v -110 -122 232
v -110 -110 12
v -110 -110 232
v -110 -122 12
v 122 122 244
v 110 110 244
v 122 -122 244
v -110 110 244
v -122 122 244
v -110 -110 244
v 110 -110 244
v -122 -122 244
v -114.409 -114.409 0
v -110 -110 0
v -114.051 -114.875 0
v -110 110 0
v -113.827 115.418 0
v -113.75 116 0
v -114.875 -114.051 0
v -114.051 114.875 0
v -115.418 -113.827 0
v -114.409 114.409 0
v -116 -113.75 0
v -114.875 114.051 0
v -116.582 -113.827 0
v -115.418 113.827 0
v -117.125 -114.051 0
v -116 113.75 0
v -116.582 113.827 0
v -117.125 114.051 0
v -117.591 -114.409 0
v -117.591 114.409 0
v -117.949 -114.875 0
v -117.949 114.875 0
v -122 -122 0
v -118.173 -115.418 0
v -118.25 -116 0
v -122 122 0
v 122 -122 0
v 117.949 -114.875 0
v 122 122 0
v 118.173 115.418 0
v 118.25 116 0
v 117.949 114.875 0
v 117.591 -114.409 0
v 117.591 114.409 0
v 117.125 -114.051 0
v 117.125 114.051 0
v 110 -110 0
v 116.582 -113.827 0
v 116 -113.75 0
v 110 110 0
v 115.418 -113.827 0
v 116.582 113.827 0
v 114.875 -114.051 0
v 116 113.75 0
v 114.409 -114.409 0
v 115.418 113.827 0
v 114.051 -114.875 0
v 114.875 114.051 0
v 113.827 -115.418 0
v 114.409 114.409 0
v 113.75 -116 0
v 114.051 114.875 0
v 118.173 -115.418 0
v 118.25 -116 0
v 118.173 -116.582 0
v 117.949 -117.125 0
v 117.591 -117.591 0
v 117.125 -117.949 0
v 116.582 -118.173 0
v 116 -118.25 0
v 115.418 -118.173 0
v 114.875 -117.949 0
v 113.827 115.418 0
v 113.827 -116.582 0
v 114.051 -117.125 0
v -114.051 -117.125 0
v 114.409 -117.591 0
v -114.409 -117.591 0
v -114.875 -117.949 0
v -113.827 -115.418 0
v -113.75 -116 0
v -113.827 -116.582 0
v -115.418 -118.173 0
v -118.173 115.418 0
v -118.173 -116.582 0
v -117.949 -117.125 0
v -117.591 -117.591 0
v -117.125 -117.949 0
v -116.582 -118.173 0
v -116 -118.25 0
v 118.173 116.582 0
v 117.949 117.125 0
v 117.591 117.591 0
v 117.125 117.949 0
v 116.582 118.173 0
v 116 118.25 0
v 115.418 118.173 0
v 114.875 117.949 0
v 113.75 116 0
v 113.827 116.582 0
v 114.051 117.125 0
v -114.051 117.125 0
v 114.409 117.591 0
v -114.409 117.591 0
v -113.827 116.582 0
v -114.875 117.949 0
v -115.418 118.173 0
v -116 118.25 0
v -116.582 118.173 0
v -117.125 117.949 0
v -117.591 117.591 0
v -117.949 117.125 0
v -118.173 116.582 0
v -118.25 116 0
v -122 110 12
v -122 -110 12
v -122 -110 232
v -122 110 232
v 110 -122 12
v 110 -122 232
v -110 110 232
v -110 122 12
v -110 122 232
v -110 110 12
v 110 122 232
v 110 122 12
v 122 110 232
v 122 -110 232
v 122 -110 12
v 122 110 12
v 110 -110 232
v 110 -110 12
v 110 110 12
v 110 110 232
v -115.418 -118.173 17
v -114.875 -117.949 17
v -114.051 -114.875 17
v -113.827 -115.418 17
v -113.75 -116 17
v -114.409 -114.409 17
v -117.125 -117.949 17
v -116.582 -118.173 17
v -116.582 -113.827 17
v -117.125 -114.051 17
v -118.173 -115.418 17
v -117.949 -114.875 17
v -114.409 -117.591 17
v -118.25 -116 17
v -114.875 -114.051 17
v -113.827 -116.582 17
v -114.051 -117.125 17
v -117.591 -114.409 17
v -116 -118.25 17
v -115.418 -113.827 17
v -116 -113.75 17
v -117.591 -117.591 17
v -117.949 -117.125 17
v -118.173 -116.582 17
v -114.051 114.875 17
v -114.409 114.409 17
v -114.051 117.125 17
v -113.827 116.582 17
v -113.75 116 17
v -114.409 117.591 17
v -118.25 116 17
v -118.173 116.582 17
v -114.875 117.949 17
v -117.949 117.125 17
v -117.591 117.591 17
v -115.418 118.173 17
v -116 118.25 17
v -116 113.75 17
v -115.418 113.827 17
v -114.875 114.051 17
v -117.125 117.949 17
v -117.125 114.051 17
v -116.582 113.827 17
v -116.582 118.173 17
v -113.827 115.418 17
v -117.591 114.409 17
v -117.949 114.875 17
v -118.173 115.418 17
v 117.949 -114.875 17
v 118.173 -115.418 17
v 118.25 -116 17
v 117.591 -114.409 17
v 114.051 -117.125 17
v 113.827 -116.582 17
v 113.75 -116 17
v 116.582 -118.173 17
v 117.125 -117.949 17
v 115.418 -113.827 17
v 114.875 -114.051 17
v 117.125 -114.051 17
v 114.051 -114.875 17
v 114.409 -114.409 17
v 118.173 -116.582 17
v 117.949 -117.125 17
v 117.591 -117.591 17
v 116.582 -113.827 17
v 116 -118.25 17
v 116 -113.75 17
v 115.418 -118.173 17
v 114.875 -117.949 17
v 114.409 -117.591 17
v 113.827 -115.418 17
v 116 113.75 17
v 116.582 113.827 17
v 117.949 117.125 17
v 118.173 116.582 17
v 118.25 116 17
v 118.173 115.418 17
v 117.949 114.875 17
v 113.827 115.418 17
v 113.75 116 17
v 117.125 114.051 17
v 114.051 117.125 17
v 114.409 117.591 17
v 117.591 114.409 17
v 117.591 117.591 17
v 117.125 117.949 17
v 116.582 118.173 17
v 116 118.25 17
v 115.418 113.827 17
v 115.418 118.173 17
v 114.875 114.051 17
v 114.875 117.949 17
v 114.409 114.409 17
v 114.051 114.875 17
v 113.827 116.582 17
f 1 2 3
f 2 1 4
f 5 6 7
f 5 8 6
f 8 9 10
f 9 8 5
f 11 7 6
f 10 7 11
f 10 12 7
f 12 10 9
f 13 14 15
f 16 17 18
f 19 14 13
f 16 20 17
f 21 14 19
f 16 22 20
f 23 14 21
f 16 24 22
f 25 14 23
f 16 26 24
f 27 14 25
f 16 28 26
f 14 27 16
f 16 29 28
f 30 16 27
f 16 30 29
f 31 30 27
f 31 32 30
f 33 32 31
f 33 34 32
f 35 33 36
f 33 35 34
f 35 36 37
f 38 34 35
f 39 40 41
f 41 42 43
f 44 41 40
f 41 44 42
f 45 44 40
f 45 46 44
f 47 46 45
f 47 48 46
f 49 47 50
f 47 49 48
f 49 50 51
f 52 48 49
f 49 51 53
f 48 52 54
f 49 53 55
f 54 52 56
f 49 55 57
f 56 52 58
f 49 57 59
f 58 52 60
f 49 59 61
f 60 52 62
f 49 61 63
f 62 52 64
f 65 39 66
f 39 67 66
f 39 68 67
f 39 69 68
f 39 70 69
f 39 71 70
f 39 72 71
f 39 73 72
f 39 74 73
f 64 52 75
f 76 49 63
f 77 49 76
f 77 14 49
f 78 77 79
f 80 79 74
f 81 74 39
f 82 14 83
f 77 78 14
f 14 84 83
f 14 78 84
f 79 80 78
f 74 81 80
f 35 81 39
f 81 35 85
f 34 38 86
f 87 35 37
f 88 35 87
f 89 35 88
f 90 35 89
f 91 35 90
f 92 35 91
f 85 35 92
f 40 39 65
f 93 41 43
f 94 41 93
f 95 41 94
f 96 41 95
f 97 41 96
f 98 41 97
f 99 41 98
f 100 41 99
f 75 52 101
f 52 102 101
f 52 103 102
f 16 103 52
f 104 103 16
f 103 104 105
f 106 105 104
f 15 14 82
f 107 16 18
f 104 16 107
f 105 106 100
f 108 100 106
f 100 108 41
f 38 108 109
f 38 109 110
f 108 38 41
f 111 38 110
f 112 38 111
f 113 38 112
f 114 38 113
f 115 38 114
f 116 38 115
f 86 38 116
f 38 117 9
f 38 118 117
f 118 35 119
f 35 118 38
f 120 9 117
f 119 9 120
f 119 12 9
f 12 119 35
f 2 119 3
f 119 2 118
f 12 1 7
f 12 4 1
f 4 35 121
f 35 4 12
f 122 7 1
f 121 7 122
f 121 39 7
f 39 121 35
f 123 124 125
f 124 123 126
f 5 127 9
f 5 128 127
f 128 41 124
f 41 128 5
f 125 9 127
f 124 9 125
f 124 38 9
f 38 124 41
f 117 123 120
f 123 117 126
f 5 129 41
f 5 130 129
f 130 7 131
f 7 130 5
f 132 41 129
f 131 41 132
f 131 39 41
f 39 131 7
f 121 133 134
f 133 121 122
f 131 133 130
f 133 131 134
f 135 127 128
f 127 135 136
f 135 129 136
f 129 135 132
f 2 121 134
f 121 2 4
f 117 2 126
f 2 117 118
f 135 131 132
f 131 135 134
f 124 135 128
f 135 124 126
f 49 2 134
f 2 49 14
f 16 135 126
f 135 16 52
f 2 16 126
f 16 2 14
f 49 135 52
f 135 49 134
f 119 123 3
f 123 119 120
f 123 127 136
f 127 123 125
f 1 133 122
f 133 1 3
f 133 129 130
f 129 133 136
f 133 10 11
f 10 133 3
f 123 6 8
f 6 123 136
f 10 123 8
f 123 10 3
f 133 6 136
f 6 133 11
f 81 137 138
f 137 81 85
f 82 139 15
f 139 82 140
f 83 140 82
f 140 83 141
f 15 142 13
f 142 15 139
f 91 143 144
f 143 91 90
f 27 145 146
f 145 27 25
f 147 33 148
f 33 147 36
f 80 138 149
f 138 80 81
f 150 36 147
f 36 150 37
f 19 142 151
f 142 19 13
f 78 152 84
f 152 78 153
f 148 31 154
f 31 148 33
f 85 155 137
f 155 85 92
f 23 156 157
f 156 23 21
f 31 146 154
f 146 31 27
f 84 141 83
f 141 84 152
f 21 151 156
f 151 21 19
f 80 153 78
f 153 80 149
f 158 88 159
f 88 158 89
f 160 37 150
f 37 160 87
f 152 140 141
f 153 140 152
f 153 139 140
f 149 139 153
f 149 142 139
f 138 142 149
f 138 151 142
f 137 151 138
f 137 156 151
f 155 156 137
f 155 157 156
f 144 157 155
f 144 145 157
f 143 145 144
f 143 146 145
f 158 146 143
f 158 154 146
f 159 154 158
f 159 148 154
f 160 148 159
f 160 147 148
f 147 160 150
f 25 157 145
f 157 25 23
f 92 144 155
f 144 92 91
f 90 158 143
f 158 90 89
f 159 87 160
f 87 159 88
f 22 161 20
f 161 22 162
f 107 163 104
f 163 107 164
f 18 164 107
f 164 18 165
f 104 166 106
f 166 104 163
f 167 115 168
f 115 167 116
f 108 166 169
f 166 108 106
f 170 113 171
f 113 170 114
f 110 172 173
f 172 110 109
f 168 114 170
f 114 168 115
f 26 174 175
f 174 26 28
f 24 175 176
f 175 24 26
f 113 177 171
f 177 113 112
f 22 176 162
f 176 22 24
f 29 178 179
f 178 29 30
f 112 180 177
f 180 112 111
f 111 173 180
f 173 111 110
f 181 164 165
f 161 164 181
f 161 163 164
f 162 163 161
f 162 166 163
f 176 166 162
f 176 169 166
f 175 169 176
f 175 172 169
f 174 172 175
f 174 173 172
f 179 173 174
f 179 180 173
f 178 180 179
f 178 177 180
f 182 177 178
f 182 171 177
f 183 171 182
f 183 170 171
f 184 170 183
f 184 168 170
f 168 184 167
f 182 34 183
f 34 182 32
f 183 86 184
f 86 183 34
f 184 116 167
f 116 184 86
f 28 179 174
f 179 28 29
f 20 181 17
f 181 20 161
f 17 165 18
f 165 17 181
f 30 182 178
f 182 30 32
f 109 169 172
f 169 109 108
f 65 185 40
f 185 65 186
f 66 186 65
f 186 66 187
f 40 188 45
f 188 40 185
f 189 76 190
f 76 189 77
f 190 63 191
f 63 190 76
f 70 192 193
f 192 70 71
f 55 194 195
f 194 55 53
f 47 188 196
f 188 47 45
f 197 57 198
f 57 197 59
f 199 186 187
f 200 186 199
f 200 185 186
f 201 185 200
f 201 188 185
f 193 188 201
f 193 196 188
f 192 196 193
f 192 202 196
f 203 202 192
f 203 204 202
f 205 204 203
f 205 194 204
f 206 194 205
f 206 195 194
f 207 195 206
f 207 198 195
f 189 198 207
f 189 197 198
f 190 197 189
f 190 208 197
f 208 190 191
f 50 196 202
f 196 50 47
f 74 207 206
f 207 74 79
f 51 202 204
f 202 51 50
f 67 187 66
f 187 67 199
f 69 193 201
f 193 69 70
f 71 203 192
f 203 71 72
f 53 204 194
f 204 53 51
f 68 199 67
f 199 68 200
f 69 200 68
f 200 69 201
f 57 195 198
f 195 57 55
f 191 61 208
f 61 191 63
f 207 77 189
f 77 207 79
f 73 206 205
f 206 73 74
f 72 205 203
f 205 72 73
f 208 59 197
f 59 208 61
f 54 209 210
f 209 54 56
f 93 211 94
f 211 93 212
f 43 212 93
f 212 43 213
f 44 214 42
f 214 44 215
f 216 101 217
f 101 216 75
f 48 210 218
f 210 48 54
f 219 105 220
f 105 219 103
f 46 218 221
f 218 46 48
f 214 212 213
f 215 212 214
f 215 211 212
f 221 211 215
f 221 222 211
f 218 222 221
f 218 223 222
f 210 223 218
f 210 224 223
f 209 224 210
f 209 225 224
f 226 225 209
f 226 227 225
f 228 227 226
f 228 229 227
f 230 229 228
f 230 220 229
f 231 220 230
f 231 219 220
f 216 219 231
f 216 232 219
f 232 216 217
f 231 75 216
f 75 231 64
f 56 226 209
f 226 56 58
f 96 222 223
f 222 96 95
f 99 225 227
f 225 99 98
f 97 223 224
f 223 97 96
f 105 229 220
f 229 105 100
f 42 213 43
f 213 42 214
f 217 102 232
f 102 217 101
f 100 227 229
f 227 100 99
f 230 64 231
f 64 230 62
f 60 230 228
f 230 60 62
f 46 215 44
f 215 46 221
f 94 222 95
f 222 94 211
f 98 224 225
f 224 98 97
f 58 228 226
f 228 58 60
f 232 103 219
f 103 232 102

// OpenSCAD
// file: ../models/drone-playground-dive-chimney/model.scad
outer=244; bar=12; chimney_height=244; base_thickness=4; mount_hole_diameter=4.5;
module dive_chimney(){ difference(){ union(){
 translate([-outer/2,-outer/2,0]) cube([outer,bar,base_thickness]); translate([-outer/2,outer/2-bar,0]) cube([outer,bar,base_thickness]);
 for(x=[-outer/2,outer/2-bar],y=[-outer/2,outer/2-bar]) translate([x,y,0]) cube([bar,bar,chimney_height]);
 for(z=[0,chimney_height-bar]) { translate([-outer/2,-outer/2,z]) cube([outer,bar,bar]); translate([-outer/2,outer/2-bar,z]) cube([outer,bar,bar]); translate([-outer/2,-outer/2,z]) cube([bar,outer,bar]); translate([outer/2-bar,-outer/2,z]) cube([bar,outer,bar]); }
 } for(x=[-outer/2+6,outer/2-6],y=[-outer/2+6,outer/2-6]) translate([x,y,-1]) cylinder(d=mount_hole_diameter,h=18,$fn=24); }}
assert(outer-2*bar>=200 && chimney_height==244); echo("SCADCTL_REQUIREMENT:parameters:PASS"); dive_chimney();
// main file
use <../models/drone-playground-dive-chimney/model.scad>
color("gold") dive_chimney();
